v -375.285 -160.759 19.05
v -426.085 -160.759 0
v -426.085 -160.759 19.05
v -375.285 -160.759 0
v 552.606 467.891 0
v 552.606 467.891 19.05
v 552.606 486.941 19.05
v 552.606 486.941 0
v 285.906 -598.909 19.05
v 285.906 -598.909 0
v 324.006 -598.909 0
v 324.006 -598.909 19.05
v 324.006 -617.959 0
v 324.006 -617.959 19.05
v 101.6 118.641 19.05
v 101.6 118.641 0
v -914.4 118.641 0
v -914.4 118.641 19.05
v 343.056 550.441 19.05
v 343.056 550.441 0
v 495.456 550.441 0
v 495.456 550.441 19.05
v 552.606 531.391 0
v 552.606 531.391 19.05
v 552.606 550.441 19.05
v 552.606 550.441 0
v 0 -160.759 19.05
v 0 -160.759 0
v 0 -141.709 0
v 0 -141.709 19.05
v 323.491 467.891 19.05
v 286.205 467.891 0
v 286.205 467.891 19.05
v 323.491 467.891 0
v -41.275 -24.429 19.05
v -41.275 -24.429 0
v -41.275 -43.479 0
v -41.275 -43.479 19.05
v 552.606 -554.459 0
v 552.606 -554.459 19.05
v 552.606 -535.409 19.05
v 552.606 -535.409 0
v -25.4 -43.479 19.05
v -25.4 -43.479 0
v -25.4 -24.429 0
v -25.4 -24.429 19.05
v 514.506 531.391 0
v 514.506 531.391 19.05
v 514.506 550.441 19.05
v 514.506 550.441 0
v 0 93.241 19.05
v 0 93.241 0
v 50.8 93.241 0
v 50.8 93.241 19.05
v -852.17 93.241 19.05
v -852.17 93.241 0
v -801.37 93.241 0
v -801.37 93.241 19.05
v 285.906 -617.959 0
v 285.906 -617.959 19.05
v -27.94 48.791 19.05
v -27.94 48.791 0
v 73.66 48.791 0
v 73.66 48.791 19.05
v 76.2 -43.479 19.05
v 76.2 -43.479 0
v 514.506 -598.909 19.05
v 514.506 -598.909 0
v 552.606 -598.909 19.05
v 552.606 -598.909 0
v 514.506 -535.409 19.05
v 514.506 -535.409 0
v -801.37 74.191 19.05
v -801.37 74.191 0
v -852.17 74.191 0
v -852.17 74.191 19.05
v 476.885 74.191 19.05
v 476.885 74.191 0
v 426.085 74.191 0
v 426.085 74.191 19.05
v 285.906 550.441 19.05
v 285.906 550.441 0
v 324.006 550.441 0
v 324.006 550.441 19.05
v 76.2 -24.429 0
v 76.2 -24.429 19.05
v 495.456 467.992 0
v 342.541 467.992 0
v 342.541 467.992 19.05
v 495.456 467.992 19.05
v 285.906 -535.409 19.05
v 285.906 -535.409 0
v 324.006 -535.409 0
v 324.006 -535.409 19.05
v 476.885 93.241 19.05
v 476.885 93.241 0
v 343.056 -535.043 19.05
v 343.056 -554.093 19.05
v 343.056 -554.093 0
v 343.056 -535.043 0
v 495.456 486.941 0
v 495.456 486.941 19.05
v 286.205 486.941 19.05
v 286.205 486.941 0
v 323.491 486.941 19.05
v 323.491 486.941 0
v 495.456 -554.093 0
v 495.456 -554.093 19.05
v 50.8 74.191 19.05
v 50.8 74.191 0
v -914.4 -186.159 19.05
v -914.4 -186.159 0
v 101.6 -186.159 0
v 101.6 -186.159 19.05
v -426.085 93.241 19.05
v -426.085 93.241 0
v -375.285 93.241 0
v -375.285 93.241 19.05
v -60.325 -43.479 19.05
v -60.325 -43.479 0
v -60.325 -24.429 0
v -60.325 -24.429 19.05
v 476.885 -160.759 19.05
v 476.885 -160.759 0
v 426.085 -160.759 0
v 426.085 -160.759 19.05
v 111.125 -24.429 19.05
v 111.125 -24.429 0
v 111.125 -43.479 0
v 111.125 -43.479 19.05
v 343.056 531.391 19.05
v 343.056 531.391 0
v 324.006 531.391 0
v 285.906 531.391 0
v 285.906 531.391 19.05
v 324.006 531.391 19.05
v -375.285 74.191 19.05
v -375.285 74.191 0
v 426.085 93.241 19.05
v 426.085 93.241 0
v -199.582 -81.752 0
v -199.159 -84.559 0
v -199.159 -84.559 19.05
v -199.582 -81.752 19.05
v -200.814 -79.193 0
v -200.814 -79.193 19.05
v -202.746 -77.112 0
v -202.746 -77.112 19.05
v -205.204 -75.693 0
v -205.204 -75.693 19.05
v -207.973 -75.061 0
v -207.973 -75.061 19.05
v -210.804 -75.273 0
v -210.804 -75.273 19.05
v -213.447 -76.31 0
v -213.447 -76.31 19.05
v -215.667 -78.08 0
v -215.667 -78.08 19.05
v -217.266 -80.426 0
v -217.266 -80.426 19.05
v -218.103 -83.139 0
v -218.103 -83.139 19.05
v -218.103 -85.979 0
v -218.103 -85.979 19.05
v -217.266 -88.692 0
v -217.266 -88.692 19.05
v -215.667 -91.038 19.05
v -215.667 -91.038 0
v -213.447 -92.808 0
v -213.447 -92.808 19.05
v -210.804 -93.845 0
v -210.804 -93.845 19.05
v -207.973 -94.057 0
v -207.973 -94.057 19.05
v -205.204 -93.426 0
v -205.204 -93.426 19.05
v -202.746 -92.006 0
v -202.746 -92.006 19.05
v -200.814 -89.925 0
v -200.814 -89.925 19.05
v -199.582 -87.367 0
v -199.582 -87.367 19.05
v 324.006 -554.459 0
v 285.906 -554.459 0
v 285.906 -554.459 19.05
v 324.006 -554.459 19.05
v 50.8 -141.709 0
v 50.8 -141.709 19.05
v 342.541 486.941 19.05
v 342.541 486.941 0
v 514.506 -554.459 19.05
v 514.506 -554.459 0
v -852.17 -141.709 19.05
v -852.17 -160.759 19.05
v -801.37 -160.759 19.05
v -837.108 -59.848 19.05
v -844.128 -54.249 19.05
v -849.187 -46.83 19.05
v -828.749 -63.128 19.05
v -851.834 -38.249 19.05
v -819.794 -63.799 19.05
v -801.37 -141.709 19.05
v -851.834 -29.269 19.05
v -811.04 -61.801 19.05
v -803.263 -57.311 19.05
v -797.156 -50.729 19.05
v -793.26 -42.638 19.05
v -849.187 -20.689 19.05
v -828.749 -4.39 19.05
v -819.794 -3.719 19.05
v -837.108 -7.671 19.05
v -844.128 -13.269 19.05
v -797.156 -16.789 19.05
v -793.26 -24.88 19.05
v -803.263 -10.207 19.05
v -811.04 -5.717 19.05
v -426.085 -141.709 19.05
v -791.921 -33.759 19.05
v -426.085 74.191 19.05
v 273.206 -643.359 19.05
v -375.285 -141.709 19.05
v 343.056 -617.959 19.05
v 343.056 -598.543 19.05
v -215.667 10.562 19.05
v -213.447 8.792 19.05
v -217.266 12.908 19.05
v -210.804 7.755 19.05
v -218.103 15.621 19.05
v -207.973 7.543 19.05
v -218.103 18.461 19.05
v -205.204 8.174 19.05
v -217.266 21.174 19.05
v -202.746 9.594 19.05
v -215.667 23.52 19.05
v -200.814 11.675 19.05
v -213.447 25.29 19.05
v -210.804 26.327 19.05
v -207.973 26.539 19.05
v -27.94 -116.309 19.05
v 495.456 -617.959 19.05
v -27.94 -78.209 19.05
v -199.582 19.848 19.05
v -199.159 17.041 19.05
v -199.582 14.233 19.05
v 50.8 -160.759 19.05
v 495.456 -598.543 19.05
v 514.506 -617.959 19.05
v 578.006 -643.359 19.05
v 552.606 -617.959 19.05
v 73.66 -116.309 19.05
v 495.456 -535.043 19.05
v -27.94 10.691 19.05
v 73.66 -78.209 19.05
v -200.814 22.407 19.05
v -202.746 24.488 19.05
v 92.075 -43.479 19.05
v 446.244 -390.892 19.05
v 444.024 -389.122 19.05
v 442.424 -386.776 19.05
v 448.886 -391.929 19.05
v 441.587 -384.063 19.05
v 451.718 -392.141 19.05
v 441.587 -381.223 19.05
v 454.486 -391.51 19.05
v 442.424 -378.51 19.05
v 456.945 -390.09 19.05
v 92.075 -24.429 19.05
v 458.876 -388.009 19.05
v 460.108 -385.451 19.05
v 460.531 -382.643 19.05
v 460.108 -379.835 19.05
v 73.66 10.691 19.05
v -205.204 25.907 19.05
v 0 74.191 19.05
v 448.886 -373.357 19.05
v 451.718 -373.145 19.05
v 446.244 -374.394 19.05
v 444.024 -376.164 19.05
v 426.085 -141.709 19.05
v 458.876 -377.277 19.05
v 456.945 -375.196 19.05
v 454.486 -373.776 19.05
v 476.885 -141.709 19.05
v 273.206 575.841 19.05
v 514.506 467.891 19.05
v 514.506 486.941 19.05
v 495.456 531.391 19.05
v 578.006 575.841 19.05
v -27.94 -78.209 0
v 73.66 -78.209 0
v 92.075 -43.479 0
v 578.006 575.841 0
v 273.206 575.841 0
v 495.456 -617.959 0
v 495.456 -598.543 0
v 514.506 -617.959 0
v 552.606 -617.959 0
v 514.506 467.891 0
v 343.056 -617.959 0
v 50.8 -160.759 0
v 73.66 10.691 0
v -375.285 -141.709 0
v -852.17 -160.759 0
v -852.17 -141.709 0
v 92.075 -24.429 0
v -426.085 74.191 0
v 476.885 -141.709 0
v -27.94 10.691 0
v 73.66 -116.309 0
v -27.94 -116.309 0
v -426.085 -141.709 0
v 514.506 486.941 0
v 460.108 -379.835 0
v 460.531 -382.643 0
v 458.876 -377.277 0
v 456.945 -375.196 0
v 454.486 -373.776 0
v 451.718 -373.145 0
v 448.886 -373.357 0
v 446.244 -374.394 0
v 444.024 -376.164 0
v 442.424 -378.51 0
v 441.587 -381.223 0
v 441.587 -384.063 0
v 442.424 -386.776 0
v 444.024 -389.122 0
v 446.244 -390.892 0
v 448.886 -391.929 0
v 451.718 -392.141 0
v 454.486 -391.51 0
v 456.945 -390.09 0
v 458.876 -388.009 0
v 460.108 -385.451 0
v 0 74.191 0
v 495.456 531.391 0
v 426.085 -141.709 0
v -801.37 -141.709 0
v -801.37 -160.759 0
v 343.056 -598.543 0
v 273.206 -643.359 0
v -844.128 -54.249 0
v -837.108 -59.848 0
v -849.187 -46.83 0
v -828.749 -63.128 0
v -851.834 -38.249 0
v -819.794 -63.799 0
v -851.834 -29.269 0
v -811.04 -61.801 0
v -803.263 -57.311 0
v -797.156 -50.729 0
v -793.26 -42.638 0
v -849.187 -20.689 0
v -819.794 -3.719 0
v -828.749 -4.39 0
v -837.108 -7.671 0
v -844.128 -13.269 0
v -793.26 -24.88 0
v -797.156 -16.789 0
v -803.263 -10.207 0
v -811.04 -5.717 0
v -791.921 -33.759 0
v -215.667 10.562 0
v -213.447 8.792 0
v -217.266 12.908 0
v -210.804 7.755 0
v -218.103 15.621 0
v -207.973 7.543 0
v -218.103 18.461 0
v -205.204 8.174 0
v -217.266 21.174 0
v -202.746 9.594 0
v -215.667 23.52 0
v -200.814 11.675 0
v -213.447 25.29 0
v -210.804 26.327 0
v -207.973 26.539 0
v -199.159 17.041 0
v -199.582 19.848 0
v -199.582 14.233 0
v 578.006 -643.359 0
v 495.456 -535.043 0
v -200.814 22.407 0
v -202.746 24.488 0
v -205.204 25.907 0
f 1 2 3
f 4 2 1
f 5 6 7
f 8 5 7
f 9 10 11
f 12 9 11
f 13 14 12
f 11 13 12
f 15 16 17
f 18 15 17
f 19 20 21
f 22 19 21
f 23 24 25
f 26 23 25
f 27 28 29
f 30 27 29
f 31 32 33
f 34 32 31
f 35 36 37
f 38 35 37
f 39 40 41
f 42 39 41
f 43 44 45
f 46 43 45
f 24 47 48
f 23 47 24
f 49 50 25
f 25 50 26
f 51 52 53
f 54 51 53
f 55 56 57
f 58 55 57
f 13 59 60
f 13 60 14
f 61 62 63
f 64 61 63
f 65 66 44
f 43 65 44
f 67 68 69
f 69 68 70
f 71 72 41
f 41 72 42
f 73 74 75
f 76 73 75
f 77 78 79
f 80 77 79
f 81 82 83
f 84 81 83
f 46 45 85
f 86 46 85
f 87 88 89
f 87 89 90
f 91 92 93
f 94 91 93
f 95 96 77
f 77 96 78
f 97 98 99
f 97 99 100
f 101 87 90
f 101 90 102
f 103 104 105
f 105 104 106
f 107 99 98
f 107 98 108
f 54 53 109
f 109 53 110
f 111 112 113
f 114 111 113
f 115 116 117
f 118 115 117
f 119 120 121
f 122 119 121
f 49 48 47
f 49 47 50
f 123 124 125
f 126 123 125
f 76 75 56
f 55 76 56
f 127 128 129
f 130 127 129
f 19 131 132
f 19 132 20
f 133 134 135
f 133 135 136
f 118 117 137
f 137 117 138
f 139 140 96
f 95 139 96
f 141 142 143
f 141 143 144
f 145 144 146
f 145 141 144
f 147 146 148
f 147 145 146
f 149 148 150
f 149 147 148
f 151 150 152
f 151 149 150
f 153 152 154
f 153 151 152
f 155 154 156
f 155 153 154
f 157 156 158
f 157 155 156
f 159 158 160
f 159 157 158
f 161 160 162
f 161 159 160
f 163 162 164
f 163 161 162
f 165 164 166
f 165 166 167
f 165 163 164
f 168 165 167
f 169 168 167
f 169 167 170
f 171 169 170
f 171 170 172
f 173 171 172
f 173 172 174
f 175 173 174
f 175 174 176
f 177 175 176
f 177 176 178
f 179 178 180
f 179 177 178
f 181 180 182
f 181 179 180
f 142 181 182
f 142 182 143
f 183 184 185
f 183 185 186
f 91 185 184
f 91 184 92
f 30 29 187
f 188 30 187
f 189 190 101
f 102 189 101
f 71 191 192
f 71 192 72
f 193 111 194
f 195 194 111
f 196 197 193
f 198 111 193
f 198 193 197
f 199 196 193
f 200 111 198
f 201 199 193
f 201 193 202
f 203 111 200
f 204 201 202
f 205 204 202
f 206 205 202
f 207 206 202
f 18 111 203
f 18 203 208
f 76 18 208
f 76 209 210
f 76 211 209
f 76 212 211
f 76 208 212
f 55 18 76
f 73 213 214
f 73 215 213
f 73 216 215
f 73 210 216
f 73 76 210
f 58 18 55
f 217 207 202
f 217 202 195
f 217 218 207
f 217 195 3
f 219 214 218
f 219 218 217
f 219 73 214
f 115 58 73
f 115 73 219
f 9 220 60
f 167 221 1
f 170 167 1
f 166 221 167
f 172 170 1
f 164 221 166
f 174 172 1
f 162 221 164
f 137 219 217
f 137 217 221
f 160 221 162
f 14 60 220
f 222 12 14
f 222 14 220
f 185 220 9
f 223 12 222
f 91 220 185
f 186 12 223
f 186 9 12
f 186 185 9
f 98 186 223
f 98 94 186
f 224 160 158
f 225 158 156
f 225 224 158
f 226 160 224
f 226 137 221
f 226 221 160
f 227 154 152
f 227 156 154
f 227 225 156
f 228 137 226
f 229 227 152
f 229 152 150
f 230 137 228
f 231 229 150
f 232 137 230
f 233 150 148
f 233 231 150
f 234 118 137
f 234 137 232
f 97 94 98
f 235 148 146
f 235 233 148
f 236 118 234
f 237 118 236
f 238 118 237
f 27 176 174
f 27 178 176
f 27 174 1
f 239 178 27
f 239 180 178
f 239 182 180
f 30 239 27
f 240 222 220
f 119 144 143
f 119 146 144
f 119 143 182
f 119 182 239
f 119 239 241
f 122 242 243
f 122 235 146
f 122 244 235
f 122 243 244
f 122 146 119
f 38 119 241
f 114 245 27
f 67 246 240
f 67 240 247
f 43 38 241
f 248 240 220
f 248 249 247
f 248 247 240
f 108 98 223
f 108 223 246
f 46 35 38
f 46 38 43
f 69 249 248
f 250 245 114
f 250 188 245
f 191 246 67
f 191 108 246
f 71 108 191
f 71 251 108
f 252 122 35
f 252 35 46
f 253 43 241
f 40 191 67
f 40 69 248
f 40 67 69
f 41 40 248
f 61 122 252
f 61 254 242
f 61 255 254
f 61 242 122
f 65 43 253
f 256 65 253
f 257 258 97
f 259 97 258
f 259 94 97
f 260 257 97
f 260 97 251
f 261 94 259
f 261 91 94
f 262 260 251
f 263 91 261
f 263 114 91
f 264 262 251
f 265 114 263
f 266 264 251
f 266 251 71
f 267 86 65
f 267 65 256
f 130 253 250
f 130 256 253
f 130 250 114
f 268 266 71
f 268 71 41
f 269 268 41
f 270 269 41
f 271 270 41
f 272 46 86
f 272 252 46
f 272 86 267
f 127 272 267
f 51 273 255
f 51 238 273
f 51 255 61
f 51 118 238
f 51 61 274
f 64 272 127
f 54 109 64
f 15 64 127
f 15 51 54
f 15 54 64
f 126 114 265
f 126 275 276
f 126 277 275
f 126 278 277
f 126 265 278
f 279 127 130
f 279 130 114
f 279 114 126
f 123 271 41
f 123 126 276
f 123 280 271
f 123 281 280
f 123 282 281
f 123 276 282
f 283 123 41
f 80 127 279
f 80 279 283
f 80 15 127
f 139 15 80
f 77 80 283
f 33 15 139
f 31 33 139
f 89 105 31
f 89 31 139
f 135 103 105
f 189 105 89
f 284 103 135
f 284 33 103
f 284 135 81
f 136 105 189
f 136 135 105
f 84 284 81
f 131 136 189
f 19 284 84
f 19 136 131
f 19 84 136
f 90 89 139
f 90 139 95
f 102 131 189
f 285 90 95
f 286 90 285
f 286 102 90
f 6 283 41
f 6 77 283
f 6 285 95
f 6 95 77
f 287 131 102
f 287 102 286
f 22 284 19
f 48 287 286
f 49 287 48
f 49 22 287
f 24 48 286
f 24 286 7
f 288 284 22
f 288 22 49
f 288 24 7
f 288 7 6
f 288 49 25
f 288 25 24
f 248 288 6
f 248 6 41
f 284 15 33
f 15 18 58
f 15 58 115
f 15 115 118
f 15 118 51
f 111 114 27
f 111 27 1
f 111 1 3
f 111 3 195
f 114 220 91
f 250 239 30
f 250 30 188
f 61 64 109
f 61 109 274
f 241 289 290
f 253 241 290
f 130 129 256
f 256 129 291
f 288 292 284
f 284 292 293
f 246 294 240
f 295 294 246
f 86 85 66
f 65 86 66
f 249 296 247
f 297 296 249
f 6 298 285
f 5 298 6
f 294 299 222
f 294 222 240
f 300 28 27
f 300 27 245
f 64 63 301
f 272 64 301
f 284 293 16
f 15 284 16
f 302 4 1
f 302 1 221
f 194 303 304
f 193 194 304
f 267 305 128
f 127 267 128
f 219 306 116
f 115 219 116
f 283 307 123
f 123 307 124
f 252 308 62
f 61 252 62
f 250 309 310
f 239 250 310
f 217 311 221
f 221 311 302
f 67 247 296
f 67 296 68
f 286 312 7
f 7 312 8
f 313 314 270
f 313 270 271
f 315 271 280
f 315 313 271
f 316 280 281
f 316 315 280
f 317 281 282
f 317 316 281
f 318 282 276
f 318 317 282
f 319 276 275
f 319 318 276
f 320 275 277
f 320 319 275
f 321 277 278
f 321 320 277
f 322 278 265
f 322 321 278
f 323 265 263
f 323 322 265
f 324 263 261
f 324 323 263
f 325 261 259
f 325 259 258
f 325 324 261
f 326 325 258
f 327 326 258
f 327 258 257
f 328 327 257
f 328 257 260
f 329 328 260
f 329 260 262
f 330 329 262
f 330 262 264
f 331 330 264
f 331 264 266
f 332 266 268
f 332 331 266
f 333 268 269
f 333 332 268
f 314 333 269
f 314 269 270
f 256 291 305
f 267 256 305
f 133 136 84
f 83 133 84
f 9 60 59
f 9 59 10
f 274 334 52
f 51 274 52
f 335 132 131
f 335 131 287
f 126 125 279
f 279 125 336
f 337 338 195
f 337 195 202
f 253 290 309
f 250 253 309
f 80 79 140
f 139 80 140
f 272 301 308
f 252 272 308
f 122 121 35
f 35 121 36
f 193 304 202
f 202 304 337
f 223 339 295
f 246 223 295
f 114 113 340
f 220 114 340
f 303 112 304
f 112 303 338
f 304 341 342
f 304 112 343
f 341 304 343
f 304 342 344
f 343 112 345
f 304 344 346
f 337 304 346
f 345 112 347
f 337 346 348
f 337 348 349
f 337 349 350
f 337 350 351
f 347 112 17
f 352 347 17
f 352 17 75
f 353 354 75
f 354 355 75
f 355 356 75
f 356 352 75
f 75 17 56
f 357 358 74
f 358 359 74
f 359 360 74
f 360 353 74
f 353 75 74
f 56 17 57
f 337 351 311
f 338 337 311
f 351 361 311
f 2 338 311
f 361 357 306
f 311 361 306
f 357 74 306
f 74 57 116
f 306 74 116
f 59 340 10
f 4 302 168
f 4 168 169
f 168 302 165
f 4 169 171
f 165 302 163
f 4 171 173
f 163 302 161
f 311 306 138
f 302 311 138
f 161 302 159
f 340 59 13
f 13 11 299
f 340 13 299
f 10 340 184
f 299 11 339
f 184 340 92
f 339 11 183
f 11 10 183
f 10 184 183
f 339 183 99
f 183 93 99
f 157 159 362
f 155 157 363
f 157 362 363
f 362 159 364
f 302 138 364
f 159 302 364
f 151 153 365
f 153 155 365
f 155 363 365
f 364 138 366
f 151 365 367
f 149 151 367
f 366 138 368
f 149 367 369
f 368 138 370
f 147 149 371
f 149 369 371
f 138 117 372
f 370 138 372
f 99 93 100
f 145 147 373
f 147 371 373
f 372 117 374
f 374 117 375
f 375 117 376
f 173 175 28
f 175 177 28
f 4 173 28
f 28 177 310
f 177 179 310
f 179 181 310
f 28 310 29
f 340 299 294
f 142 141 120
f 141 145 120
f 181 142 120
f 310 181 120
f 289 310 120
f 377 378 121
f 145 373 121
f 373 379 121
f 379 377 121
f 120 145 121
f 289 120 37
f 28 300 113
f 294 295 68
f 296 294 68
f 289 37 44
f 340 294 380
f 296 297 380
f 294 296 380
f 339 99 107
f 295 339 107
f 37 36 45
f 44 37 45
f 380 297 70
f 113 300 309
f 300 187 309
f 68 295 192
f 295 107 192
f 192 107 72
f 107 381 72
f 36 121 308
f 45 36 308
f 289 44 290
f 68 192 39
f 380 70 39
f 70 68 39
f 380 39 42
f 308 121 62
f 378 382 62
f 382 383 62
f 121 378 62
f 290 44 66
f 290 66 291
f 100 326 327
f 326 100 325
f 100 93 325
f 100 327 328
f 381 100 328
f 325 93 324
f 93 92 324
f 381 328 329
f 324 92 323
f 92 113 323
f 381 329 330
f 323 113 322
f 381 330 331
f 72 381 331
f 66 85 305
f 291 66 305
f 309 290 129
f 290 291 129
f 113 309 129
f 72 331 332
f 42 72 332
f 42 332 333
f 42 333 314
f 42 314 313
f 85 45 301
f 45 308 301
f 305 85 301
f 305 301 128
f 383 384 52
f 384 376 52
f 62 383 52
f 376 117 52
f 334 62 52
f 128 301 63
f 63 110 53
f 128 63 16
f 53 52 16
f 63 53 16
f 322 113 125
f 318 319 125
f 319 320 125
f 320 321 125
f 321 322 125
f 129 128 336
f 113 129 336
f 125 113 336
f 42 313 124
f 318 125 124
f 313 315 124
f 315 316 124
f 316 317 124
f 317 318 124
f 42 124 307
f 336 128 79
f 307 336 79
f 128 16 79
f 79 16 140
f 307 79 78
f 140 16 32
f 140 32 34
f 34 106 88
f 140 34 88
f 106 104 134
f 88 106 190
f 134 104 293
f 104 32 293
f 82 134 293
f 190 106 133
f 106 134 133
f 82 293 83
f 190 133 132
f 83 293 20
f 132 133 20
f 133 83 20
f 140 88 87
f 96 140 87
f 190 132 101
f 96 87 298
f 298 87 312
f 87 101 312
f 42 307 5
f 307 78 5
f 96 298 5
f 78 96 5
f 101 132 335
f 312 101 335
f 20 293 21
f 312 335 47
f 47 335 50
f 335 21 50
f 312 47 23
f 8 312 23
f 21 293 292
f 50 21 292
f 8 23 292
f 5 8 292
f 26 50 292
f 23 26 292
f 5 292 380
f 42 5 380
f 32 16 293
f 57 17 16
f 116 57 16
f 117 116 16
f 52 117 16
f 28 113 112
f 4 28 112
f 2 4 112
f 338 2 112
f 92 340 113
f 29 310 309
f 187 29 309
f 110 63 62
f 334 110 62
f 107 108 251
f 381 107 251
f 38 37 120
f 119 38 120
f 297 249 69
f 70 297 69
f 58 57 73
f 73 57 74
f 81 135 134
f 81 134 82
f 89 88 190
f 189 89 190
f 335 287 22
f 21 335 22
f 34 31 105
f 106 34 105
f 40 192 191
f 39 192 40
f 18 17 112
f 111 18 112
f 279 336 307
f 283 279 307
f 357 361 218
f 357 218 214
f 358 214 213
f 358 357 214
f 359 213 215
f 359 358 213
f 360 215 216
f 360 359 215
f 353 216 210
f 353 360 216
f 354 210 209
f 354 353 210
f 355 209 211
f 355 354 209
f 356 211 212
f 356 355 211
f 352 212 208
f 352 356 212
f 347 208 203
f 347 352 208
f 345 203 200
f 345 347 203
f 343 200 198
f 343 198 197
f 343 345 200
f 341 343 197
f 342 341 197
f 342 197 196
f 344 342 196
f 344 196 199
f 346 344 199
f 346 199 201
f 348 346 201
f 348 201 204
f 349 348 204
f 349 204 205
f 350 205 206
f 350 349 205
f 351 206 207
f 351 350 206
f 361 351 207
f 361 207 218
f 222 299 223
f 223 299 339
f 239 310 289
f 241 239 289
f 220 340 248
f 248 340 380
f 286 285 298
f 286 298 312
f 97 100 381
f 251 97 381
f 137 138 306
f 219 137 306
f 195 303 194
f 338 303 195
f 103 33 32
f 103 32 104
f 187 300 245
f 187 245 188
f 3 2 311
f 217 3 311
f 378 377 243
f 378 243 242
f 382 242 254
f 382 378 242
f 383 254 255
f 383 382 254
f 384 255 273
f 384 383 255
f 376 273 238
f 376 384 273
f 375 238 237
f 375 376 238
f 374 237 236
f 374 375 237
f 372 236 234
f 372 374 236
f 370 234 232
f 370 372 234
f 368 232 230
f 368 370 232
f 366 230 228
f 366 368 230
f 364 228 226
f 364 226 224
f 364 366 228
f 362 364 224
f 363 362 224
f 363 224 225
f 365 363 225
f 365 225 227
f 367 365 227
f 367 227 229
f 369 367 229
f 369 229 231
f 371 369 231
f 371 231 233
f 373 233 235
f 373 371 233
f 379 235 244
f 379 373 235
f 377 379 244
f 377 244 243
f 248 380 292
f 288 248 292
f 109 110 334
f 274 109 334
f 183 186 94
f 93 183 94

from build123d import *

# Parameters (mm, degrees)
F0_W     = 38.1
F0_H     = 19.05
F0_W_2   = 152.4
F0_H_2   = 19.416131
F0_R     = 9.525
F0_W_3   = 50.8
F0_R_2   = 30.1244
F0_W_4   = 37.285626
F0_W_5   = 152.91512
F0_H_3   = 18.948435
F1_DEPTH = 19.05


with BuildPart() as f1:
    # F0 (on Top) → F1 (new body)
    with BuildSketch(Plane.XY):
        Polygon((273.206008, -643.359119), (578.006008, -643.359119), (578.006008, -186.159119), (578.006008, -167.109119), (578.006008, -160.759119), (476.885, -160.759119), (426.085, -160.759119), (101.6, -160.759119), (101.6, -186.159119), align=None)
        with Locations((304.956008, -608.434119)):
            Rectangle(F0_W, F0_H, mode=Mode.SUBTRACT)
        with Locations((304.956008, -544.934119)):
            Rectangle(F0_W, F0_H, mode=Mode.SUBTRACT)
        with Locations((419.256008, -608.251053)):
            Rectangle(F0_W_2, F0_H_2, mode=Mode.SUBTRACT)
        with Locations((533.556008, -608.434119)):
            Rectangle(F0_W, F0_H, mode=Mode.SUBTRACT)
        with Locations((419.256008, -544.567988)):
            Rectangle(F0_W_2, F0_H, mode=Mode.SUBTRACT)
        with Locations((533.556008, -544.934119)):
            Rectangle(F0_W, F0_H, mode=Mode.SUBTRACT)
        with Locations((451.006008, -382.642988)):
            Circle(F0_R, mode=Mode.SUBTRACT)
        Polygon((-914.4, -186.159119), (101.6, -186.159119), (101.6, -160.759119), (101.6, -43.478698), (92.075, -43.478698), (92.075, -24.428698), (101.6, -24.428698), (101.6, 93.240881), (50.8, 93.240881), (50.8, 74.190881), (0, 74.190881), (0, 93.240881), (-375.285, 93.240881), (-375.285, 74.190881), (-426.085, 74.190881), (-426.085, 93.240881), (-801.37, 93.240881), (-801.37, 74.190881), (-852.17, 74.190881), (-852.17, 93.240881), (-914.4, 93.240881), (-914.4, 74.190881), (-914.4, -167.109119), align=None)
        with Locations((-826.77, -151.234119)):
            Rectangle(F0_W_3, F0_H, mode=Mode.SUBTRACT)
        with Locations((-822.0456, -33.759119)):
            Circle(F0_R_2, mode=Mode.SUBTRACT)
        with Locations((-400.685, -151.234119)):
            Rectangle(F0_W_3, F0_H, mode=Mode.SUBTRACT)
        with Locations((-208.684325, -84.559119)):
            Circle(F0_R, mode=Mode.SUBTRACT)
        Polygon((-41.275, -24.428698), (-41.275, -33.953698), (-41.275, -43.478698), (-60.325, -43.478698), (-60.325, -33.953698), (-60.325, -24.428698), align=None, mode=Mode.SUBTRACT)
        with Locations((25.4, -151.234119)):
            Rectangle(F0_W_3, F0_H, mode=Mode.SUBTRACT)
        Polygon((-27.94, -78.209119), (24.7487, -78.209119), (73.66, -78.209119), (73.66, -116.309119), (-27.94, -116.309119), align=None, mode=Mode.SUBTRACT)
        Polygon((-25.4, -24.428698), (24.7487, -24.428698), (76.2, -24.428698), (76.2, -43.478698), (24.7487, -43.478698), (-25.4, -43.478698), (-25.4, -33.953698), align=None, mode=Mode.SUBTRACT)
        with Locations((-208.684325, 17.040881)):
            Circle(F0_R, mode=Mode.SUBTRACT)
        Polygon((-27.94, 10.690881), (-27.94, 48.790881), (73.66, 48.790881), (73.66, 10.690881), (24.7487, 10.690881), align=None, mode=Mode.SUBTRACT)
        Polygon((476.885, -160.759119), (578.006008, -160.759119), (578.006008, 74.190881), (578.006008, 93.240881), (476.885, 93.240881), (476.885, 74.190881), (426.085, 74.190881), (426.085, 93.240881), (101.6, 93.240881), (101.6, -24.428698), (111.125, -24.428698), (111.125, -43.478698), (101.6, -43.478698), (101.6, -160.759119), (426.085, -160.759119), (426.085, -141.709119), (476.885, -141.709119), align=None)
        Polygon((476.885, 93.240881), (578.006008, 93.240881), (578.006008, 575.840881), (273.206008, 575.840881), (101.6, 118.640881), (101.6, 93.240881), (426.085, 93.240881), align=None)
        with Locations((304.848075, 477.415881)):
            Rectangle(F0_W_4, F0_H, mode=Mode.SUBTRACT)
        with Locations((304.956008, 540.915881)):
            Rectangle(F0_W, F0_H, mode=Mode.SUBTRACT)
        with Locations((418.998448, 477.466663)):
            Rectangle(F0_W_5, F0_H_3, mode=Mode.SUBTRACT)
        with Locations((533.556008, 477.415881)):
            Rectangle(F0_W, F0_H, mode=Mode.SUBTRACT)
        with Locations((419.256008, 540.915881)):
            Rectangle(F0_W_2, F0_H, mode=Mode.SUBTRACT)
        with Locations((533.556008, 540.915881)):
            Rectangle(F0_W, F0_H, mode=Mode.SUBTRACT)
        Polygon((-914.4, 118.640881), (-914.4, 93.240881), (-852.17, 93.240881), (-801.37, 93.240881), (-426.085, 93.240881), (-375.285, 93.240881), (0, 93.240881), (50.8, 93.240881), (101.6, 93.240881), (101.6, 118.640881), align=None)
    extrude(amount=F1_DEPTH)


solid = f1.part
